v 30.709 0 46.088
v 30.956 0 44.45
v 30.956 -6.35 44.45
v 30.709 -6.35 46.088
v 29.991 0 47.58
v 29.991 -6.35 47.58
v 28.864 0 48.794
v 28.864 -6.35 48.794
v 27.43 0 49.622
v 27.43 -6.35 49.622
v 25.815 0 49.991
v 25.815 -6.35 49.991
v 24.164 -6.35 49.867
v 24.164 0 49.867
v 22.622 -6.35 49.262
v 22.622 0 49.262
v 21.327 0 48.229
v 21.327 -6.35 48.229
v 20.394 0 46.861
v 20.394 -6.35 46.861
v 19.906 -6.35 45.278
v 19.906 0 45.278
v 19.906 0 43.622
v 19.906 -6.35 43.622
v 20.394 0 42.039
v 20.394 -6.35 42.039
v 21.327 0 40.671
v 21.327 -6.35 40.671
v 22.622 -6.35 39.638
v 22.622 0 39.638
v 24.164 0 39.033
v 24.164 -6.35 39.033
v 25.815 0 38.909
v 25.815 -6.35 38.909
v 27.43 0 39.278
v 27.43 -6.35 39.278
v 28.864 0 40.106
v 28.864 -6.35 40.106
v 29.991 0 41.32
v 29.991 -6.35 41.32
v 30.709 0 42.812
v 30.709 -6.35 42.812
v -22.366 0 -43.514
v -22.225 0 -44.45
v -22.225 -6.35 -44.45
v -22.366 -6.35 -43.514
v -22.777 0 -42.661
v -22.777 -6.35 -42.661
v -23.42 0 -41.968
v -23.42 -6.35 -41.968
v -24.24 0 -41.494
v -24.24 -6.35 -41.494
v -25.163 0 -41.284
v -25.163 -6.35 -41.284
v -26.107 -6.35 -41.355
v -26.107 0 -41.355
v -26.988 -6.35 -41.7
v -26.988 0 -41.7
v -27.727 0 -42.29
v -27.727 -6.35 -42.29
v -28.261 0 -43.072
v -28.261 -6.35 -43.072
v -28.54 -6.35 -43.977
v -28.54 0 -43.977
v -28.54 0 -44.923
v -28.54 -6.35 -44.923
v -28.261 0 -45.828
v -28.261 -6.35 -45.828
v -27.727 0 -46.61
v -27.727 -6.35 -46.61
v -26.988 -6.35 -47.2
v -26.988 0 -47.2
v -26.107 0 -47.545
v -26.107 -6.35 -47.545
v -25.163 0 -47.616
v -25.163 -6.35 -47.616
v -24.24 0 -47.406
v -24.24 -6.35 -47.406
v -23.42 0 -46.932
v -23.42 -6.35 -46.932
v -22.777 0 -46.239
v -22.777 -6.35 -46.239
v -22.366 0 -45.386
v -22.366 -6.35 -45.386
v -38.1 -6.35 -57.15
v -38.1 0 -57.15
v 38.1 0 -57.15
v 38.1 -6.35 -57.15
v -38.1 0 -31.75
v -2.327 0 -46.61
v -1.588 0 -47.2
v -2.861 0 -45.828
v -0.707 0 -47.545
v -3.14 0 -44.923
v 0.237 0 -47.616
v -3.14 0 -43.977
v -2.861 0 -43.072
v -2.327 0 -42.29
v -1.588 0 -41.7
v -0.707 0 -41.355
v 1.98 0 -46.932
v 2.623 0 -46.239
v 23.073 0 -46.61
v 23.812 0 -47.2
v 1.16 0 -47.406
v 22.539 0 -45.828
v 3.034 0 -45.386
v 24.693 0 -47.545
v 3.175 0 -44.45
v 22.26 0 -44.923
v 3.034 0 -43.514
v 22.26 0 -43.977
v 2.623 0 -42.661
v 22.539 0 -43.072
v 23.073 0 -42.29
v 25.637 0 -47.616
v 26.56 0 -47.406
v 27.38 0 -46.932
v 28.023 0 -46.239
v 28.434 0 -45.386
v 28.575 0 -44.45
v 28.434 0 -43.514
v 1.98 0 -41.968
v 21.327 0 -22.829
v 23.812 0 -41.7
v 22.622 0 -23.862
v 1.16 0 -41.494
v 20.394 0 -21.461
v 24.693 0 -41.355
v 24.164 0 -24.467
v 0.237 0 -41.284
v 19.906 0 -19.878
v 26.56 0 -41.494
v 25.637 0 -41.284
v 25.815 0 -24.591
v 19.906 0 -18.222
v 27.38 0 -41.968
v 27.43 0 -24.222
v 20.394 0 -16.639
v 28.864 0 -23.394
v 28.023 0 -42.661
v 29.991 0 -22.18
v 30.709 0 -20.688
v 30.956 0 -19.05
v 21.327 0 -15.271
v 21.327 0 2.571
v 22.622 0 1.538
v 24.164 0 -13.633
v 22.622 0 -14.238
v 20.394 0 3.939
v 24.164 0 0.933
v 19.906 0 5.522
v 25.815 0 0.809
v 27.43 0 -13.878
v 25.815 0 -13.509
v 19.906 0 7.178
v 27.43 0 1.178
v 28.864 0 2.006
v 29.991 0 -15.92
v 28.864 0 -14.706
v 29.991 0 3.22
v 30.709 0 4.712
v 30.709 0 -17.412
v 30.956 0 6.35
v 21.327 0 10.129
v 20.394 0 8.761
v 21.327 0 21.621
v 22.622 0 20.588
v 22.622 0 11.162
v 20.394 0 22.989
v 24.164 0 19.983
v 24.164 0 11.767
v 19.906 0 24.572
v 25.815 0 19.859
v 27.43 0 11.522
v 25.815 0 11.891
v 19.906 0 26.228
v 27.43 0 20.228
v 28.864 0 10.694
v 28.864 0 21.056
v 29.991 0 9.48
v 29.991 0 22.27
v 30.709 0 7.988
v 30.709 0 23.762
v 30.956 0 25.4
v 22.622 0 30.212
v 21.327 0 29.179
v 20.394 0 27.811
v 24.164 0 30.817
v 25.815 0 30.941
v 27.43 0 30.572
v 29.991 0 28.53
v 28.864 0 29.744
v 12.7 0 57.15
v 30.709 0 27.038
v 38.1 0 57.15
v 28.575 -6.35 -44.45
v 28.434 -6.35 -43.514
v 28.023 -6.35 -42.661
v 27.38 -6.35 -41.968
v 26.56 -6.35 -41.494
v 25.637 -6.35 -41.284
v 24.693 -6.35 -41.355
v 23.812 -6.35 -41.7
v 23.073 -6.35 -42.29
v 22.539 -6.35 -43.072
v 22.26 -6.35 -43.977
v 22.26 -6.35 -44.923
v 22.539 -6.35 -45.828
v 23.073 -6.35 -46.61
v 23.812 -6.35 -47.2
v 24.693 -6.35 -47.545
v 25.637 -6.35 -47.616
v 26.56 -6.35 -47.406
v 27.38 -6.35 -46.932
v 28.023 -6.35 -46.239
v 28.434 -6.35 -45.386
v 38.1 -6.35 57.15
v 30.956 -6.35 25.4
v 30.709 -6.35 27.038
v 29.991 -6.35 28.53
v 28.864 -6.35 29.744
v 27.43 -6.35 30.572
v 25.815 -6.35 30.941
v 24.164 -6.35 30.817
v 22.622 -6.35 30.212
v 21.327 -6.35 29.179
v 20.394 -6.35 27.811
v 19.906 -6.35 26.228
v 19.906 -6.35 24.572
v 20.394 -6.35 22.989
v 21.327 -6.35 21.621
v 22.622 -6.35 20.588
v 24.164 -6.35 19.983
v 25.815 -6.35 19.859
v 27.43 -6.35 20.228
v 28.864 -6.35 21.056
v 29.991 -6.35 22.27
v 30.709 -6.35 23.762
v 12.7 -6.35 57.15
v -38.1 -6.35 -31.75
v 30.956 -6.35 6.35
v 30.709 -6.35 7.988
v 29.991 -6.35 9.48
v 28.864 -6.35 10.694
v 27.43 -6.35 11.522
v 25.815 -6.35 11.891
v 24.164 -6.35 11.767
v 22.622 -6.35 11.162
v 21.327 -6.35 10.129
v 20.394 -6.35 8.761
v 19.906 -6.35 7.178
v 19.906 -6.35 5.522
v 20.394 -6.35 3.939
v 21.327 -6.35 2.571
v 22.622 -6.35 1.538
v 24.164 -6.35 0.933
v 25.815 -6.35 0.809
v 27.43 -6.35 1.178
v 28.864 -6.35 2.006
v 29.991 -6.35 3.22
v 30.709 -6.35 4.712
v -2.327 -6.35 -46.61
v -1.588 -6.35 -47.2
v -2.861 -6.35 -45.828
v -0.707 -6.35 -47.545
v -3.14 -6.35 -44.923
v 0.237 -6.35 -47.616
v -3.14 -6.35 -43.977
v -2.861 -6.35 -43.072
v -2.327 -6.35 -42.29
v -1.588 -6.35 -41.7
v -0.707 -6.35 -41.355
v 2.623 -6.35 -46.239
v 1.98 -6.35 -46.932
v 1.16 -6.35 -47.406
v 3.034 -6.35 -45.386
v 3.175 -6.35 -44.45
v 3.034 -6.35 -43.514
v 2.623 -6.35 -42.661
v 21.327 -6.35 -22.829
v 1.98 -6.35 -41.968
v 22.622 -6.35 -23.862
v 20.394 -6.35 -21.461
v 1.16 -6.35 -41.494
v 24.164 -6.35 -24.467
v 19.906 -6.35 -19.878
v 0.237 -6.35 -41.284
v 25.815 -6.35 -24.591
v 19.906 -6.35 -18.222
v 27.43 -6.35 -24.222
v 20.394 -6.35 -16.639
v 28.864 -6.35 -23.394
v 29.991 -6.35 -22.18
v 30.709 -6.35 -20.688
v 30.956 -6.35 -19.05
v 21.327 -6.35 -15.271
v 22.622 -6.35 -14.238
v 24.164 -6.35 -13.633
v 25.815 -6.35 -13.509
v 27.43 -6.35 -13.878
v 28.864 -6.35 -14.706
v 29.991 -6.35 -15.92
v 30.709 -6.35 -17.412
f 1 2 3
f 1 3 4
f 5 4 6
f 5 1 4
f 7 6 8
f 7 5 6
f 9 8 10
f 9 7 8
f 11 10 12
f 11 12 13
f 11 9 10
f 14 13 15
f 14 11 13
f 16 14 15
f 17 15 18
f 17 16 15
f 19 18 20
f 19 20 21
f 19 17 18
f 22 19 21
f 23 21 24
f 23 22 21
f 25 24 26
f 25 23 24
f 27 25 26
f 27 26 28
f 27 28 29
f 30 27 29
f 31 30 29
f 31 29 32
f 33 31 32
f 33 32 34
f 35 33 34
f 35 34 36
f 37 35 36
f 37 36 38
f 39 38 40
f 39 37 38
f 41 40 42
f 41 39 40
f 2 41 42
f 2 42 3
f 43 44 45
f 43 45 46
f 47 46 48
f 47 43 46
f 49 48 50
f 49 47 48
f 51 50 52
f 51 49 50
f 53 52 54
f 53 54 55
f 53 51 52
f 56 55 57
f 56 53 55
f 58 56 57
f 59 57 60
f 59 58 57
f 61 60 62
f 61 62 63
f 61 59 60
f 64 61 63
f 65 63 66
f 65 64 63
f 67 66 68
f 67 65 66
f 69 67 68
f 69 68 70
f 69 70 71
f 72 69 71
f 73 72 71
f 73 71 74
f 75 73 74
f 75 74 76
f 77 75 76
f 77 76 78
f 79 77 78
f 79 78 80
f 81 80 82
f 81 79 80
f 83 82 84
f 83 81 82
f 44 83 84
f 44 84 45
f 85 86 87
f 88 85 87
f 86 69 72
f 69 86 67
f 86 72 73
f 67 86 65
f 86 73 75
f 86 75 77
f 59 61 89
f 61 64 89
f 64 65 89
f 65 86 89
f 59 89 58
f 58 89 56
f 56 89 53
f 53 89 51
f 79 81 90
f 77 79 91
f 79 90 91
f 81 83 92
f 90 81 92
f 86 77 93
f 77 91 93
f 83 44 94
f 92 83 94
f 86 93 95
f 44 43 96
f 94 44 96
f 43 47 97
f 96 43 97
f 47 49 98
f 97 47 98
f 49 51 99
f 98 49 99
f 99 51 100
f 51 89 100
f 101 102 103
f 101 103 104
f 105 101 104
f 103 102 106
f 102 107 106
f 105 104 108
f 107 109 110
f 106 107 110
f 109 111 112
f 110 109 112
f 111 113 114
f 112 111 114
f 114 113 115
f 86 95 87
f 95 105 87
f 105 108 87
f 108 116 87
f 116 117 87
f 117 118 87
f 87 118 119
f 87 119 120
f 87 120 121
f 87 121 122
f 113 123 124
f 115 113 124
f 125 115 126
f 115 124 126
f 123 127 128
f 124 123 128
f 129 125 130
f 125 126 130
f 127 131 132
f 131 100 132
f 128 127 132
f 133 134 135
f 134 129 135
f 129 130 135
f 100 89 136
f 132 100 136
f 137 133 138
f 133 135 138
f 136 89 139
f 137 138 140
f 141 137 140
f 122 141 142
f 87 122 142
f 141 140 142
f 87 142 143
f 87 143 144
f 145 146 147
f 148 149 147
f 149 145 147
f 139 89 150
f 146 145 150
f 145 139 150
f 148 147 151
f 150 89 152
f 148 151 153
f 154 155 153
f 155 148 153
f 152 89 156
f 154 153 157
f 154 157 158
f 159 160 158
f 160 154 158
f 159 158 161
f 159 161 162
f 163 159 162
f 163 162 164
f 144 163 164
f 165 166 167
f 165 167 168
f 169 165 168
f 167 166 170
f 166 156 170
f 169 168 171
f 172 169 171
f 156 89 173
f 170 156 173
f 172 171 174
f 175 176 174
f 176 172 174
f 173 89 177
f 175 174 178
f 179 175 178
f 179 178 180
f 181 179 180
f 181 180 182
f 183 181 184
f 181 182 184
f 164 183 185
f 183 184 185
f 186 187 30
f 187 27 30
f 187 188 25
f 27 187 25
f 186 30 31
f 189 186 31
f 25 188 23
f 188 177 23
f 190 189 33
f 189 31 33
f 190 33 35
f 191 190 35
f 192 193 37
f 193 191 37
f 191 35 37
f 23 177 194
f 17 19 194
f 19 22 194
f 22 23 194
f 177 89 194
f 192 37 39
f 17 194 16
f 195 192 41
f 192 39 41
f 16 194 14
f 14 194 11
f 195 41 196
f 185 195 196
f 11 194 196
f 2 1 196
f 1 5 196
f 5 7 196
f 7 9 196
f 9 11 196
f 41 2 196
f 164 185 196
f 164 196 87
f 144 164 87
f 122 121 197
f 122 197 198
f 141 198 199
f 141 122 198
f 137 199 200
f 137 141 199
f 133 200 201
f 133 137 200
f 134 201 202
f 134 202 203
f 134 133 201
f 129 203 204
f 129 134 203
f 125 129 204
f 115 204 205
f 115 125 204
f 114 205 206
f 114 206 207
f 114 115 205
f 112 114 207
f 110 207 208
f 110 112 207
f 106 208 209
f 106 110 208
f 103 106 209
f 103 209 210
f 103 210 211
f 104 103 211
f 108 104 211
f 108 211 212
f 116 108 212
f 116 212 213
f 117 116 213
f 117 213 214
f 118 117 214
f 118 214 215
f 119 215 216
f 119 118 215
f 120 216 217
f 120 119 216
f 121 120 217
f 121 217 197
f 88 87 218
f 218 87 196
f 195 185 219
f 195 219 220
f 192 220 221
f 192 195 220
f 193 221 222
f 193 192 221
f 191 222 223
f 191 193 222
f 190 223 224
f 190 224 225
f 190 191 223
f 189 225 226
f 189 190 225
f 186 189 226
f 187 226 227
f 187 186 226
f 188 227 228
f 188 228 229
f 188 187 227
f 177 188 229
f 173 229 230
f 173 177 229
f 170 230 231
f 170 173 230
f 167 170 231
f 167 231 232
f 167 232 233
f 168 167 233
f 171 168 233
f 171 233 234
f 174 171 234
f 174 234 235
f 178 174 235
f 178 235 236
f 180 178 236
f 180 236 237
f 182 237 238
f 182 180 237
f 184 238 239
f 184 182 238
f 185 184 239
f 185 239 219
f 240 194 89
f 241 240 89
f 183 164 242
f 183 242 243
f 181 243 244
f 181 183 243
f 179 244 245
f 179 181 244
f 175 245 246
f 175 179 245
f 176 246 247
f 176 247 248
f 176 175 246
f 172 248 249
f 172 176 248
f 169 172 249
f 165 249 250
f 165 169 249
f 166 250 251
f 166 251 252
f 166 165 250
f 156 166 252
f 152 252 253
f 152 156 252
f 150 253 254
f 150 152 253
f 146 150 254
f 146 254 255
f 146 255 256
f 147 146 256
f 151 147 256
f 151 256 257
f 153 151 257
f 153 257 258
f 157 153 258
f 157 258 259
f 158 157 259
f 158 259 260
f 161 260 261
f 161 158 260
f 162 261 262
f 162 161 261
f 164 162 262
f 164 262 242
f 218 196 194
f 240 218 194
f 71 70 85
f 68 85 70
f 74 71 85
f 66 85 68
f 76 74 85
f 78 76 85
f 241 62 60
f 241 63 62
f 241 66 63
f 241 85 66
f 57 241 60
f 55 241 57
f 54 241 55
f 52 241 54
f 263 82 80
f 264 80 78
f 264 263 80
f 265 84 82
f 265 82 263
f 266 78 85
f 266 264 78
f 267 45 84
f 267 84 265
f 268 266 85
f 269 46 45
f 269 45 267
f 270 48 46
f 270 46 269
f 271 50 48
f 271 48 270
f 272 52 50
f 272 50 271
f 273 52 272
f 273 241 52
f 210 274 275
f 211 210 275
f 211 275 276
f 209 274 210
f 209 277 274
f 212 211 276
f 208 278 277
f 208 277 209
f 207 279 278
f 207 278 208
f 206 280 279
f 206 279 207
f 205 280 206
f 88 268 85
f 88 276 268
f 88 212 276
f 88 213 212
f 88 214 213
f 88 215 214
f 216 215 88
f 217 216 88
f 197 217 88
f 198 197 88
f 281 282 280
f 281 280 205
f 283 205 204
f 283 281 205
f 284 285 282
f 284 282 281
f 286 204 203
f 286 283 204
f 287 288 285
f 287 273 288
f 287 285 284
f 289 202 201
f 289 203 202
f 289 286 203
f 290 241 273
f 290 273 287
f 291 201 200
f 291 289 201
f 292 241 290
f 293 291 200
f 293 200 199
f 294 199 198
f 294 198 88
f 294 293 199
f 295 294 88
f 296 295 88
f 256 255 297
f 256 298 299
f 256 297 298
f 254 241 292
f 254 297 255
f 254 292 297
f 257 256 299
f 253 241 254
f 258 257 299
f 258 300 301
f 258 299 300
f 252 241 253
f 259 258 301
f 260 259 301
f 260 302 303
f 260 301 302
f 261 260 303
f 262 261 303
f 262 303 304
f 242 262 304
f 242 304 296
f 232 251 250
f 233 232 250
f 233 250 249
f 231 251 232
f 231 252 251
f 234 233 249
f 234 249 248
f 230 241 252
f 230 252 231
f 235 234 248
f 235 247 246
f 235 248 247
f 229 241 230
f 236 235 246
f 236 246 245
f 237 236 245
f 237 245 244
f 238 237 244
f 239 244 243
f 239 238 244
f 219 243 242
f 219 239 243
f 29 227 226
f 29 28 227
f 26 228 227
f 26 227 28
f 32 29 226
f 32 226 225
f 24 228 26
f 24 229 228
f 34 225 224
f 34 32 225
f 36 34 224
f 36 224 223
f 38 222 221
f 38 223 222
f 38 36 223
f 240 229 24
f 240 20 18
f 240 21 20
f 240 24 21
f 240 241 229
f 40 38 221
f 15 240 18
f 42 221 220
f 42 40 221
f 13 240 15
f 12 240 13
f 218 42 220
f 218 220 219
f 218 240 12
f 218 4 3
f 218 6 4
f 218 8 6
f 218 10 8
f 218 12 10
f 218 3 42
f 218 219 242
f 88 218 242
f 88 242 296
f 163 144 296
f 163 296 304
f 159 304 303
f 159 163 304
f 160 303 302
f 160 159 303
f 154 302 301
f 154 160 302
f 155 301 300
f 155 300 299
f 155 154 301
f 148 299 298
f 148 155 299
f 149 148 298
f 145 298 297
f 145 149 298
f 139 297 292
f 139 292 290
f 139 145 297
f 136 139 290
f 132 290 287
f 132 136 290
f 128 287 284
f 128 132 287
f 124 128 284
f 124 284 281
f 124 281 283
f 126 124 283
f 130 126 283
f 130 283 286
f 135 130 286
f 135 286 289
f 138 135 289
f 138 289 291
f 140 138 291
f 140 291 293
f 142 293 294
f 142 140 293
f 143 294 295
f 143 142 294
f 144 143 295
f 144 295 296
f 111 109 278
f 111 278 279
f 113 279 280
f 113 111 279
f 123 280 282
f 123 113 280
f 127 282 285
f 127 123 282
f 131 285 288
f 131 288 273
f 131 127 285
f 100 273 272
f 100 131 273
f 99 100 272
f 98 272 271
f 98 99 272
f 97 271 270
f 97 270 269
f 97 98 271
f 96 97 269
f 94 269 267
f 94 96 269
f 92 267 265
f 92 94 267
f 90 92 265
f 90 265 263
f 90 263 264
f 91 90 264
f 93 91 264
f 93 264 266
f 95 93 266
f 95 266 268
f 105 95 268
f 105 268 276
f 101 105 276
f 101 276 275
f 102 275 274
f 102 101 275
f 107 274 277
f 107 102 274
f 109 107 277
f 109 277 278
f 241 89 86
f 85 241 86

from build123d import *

# Parameters (mm, degrees)
F0_R     = 3.175
F0_R_2   = 5.55625
F1_DEPTH = 6.35


with BuildPart() as f1:
    # F0 (on Front) → F1 (new body)
    with BuildSketch(Plane.XZ):
        Polygon((38.1, -57.15), (38.1, 57.15), (12.7, 57.15), (-38.1, -31.75), (-38.1, -57.15), align=None)
        with Locations((-25.4, -44.45)):
            Circle(F0_R, mode=Mode.SUBTRACT)
        with Locations((0, -44.45)):
            Circle(F0_R, mode=Mode.SUBTRACT)
        with Locations((25.4, -44.45)):
            Circle(F0_R, mode=Mode.SUBTRACT)
        with Locations((25.4, -19.05)):
            Circle(F0_R_2, mode=Mode.SUBTRACT)
        with Locations((25.4, 6.35)):
            Circle(F0_R_2, mode=Mode.SUBTRACT)
        with Locations((25.4, 25.4)):
            Circle(F0_R_2, mode=Mode.SUBTRACT)
        with Locations((25.4, 44.45)):
            Circle(F0_R_2, mode=Mode.SUBTRACT)
    extrude(amount=F1_DEPTH)


solid = f1.part
